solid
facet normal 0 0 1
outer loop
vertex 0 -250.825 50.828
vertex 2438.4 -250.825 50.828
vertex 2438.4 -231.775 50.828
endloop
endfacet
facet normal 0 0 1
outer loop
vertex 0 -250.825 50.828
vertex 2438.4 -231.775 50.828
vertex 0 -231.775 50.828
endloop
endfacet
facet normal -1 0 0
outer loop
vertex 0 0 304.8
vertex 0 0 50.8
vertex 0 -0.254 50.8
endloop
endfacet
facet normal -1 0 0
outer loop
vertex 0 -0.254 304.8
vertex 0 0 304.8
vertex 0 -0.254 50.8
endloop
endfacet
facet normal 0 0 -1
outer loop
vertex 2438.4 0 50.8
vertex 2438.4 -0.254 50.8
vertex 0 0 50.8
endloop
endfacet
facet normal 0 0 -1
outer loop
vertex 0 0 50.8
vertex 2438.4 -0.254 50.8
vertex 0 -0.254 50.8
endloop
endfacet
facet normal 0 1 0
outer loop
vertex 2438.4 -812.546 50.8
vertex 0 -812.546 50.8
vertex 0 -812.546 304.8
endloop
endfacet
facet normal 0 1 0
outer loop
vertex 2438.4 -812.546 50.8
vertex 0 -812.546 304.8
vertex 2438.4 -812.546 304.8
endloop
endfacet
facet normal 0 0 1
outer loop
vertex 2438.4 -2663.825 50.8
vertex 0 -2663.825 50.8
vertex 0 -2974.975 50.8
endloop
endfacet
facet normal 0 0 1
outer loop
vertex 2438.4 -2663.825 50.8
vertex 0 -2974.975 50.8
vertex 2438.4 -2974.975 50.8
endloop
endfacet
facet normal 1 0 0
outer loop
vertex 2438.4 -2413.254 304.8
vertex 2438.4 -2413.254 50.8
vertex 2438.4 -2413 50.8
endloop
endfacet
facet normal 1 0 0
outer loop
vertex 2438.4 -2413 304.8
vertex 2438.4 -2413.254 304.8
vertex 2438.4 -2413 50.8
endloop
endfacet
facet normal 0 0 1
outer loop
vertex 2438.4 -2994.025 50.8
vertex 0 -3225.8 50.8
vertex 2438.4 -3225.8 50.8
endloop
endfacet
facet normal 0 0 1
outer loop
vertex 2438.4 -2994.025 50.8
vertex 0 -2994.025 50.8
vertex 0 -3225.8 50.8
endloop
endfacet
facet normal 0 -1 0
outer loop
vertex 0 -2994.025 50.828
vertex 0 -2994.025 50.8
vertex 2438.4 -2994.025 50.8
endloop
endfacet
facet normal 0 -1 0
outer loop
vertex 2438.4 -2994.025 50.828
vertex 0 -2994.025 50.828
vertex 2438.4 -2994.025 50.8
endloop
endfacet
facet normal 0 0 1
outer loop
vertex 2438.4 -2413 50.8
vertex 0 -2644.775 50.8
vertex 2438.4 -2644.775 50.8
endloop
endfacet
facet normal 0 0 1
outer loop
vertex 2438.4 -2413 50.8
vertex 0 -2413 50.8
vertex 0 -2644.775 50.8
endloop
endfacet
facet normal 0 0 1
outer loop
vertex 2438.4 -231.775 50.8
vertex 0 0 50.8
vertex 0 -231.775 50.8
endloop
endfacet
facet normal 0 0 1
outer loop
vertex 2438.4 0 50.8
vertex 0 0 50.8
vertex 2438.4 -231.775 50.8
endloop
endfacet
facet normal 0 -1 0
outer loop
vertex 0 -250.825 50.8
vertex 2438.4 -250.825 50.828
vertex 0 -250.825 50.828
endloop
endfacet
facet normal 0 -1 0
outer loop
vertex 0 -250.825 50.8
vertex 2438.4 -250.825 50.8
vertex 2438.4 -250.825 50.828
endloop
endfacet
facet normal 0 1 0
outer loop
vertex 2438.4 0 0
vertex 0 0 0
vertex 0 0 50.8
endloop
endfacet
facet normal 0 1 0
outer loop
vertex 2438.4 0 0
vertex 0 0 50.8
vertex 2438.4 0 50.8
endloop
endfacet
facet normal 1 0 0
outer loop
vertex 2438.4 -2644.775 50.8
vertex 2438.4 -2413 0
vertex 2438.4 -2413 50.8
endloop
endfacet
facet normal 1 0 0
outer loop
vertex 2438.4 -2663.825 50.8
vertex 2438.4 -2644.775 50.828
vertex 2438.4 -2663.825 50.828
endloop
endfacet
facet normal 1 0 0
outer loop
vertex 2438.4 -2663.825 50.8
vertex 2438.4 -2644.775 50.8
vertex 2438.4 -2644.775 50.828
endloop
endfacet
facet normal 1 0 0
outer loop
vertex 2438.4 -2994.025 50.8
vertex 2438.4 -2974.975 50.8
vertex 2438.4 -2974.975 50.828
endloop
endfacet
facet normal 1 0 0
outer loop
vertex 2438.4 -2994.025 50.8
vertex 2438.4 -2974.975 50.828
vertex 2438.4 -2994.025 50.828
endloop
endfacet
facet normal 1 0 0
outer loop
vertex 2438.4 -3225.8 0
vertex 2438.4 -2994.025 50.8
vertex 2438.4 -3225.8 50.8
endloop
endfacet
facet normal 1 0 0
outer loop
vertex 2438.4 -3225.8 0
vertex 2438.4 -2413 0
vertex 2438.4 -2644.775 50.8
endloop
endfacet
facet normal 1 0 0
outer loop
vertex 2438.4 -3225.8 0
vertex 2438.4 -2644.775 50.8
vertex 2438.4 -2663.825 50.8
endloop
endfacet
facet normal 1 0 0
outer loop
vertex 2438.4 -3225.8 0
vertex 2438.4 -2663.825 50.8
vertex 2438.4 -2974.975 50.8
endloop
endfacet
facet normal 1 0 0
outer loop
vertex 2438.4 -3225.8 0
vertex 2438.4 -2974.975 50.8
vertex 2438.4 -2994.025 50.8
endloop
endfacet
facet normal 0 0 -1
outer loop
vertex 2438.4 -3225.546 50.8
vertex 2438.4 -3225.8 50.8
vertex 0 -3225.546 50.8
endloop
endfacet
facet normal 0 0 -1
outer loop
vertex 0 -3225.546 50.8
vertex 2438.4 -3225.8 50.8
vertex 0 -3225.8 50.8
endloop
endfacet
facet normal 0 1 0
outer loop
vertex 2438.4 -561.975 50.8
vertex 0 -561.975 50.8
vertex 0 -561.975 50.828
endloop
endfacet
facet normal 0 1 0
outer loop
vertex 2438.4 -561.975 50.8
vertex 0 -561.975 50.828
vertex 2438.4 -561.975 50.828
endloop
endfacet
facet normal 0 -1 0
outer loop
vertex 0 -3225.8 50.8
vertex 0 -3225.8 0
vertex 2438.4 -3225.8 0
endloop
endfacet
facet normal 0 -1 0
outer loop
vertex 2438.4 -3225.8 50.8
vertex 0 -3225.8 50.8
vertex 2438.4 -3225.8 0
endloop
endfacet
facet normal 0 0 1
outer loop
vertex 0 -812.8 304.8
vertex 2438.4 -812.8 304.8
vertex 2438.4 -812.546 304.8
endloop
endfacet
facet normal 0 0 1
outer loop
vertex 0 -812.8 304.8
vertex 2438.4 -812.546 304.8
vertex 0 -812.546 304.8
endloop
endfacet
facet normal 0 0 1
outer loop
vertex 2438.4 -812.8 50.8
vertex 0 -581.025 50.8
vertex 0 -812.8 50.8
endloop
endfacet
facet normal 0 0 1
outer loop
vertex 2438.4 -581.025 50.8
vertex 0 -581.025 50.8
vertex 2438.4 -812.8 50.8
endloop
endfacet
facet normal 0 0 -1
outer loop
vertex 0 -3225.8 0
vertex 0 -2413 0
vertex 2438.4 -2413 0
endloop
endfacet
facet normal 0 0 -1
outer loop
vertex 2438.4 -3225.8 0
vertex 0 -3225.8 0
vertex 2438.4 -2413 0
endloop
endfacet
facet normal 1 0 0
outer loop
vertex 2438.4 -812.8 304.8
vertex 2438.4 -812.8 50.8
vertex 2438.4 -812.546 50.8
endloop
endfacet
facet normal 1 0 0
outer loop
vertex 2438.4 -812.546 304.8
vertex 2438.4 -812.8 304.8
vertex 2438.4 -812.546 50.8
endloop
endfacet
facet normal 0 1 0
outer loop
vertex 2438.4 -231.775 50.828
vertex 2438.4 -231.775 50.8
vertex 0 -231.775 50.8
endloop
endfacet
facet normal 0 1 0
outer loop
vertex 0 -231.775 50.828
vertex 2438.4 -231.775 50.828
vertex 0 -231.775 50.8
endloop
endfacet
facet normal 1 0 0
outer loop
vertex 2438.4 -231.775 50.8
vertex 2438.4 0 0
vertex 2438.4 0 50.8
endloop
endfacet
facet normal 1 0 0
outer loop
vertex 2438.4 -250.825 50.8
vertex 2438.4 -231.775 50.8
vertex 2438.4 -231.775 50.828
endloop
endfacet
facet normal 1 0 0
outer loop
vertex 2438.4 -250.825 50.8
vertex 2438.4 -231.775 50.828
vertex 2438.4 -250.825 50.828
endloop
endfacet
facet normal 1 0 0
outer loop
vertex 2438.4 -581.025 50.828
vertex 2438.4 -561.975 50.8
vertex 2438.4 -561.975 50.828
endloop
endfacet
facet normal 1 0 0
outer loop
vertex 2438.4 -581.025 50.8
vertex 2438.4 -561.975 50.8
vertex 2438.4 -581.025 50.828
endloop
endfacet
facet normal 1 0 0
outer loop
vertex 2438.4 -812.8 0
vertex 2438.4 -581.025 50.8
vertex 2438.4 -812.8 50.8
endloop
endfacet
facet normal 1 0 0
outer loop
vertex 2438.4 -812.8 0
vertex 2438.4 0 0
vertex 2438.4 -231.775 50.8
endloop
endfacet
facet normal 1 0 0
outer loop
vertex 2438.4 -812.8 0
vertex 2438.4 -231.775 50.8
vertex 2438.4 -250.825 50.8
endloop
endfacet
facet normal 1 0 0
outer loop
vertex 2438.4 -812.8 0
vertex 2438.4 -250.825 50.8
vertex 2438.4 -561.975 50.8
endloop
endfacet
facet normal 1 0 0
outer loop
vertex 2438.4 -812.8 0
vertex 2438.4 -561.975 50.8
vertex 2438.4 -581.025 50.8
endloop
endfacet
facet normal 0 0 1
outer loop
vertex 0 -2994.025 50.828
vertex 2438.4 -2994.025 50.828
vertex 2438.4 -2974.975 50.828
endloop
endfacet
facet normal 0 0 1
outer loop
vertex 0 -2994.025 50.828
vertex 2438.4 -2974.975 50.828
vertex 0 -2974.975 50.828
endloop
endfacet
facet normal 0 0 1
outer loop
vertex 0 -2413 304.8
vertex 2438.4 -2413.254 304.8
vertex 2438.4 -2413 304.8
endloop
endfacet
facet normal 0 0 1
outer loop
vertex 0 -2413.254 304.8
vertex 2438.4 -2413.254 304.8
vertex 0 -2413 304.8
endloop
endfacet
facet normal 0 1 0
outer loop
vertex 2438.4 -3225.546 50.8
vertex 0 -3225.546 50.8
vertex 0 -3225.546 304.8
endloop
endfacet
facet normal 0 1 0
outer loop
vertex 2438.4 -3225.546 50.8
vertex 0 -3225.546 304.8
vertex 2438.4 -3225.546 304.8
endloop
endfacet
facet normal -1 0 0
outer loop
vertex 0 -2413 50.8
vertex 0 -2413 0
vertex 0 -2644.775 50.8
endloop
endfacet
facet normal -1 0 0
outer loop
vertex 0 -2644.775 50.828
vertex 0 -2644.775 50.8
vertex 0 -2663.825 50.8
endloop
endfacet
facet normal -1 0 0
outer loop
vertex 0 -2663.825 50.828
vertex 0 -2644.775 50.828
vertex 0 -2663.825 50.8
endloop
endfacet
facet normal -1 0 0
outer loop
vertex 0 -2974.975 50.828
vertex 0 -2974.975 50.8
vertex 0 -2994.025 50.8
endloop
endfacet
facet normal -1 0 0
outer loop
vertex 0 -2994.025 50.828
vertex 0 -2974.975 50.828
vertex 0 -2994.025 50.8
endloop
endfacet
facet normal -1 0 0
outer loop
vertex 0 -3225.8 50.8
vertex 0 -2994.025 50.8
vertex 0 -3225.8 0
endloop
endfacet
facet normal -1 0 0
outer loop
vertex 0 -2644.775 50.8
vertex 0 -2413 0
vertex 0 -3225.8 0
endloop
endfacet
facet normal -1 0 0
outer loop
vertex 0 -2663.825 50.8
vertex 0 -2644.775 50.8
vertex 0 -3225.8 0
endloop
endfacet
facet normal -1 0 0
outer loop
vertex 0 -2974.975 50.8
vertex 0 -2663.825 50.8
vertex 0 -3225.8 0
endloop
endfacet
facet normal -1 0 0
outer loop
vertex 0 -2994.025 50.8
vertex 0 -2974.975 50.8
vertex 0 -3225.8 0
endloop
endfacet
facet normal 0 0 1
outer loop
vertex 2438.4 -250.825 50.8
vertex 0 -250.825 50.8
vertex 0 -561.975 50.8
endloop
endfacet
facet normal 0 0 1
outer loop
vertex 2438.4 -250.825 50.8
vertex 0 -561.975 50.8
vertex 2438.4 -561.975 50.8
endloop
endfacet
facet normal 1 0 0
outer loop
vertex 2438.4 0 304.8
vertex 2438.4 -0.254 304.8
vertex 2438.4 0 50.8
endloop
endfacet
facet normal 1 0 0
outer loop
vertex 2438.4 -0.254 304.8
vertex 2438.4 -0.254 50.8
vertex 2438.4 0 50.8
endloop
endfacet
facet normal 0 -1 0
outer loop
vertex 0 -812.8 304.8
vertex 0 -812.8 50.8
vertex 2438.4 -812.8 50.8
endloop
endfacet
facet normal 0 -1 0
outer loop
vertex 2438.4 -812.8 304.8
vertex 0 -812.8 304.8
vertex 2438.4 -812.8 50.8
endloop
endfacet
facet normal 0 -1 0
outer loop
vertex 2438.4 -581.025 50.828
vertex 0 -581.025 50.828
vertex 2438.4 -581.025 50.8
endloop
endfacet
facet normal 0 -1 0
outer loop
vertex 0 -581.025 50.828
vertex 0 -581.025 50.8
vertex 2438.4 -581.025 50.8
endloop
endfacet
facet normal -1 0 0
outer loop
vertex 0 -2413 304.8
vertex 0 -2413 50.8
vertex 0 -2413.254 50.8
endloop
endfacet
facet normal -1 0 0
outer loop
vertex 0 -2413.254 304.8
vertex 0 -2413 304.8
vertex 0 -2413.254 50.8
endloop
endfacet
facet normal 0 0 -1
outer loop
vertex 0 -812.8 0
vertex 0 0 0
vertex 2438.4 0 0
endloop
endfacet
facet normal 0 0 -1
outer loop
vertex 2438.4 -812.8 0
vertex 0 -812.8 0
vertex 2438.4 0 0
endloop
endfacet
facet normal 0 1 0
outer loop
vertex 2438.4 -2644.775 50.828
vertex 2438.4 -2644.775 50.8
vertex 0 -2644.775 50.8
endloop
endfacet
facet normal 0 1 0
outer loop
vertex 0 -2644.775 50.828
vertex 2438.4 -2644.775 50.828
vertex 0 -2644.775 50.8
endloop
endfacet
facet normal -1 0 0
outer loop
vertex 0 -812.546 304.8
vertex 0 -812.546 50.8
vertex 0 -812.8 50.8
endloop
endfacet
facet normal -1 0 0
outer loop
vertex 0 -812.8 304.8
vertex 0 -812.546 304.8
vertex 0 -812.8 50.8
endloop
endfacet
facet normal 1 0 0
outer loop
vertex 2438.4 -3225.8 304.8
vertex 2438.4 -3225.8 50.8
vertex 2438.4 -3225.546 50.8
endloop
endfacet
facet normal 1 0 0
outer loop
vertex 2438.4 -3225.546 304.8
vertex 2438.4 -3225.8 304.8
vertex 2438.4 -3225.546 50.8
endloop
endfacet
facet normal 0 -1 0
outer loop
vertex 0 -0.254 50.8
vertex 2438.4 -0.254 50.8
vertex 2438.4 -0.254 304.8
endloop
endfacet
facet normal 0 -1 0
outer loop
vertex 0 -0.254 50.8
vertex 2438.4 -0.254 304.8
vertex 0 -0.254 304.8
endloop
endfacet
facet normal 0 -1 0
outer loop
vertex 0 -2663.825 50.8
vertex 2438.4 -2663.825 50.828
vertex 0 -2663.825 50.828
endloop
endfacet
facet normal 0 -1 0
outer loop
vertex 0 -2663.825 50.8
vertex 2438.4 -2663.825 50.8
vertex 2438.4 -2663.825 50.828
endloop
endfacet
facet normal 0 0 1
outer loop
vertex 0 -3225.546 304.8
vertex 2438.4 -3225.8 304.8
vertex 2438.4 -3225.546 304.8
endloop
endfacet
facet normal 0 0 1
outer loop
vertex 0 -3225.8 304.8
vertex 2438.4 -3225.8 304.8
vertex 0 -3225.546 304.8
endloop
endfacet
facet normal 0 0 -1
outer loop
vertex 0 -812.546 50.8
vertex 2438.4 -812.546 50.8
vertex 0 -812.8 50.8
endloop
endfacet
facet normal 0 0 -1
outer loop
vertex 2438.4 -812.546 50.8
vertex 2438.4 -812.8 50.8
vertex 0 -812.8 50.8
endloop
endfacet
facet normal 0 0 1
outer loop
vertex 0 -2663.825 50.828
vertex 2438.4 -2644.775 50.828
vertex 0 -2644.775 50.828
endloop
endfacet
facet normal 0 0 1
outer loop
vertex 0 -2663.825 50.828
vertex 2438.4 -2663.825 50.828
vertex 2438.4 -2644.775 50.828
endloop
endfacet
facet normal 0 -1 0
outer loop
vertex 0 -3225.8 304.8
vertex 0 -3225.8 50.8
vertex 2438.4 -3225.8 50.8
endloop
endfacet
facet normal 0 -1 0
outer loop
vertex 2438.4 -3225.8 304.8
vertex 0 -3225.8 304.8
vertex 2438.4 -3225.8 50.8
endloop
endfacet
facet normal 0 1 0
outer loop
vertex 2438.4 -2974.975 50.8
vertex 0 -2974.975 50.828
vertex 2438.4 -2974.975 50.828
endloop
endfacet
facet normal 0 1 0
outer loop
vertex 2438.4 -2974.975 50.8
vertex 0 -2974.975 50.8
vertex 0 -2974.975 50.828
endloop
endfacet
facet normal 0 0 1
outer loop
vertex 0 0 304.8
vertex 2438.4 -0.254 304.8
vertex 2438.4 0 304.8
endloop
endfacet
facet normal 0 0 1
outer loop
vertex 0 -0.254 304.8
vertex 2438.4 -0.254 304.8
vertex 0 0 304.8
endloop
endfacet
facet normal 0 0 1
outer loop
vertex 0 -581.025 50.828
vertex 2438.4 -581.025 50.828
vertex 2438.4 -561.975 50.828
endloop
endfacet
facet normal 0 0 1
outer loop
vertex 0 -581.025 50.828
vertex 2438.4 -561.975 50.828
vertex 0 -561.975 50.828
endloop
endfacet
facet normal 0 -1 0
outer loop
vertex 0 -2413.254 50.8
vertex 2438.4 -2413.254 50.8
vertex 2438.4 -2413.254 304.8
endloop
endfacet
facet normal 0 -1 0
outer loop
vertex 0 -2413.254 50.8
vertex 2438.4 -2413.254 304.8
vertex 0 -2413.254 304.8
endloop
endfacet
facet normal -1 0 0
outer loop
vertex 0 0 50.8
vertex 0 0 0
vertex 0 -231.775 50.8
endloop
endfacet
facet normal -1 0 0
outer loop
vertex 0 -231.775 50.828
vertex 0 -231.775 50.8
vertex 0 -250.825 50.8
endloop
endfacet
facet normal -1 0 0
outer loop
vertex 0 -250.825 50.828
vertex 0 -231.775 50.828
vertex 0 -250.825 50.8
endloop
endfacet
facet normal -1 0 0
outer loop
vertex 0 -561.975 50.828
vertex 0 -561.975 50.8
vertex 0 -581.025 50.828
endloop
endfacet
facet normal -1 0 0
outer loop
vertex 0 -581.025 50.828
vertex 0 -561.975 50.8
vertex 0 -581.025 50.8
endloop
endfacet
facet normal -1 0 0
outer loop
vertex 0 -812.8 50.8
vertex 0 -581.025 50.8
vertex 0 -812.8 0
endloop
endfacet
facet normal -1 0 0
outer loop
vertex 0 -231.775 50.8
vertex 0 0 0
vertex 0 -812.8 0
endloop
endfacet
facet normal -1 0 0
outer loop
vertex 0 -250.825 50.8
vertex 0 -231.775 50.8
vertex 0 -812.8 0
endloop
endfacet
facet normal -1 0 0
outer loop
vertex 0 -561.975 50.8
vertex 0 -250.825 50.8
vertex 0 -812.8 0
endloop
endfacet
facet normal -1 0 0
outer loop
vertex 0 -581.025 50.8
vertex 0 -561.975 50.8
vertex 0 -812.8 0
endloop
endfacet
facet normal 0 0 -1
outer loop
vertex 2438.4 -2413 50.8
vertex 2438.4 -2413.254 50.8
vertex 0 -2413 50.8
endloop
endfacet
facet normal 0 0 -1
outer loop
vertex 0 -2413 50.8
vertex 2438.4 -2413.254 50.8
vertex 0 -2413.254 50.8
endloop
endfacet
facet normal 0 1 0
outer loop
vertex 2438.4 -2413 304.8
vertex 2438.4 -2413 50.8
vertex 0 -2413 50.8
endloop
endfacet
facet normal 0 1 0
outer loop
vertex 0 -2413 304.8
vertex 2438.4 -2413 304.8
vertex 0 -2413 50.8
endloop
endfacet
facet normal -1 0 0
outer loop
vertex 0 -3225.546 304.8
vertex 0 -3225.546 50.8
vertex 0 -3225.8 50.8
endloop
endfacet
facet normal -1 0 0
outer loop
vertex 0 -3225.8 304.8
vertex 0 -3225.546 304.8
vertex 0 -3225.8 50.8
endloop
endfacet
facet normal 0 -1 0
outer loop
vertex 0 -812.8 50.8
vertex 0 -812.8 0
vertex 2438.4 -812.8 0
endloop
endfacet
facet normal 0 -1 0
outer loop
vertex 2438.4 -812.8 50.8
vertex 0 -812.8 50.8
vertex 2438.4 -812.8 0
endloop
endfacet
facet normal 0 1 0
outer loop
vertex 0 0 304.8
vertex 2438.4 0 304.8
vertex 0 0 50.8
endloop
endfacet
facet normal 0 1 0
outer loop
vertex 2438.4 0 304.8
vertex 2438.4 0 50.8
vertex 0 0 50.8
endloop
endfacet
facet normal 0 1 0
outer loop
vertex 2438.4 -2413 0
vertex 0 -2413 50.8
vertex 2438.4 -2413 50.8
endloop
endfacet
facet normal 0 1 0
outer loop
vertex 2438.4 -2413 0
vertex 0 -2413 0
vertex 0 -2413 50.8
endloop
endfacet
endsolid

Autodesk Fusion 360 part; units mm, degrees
sketch "Sketch1" plane through (0, 0, 0) normal (0, 0, 1) x (1, 0, 0)
  line L0 (0, 0) -> (0, -812.8)
  line L1 (0, -812.8) -> (0, -2413)
  line L2 (0, -2413) -> (0, -3225.8)
  line L3 (0, 0) -> (1219.2, 0)
  line L4 (1219.2, 0) -> (0, 0)
  line L5 (0, 0) -> (0, -812.8)
  line L6 (0, -812.8) -> (1219.2, -812.8)
  line L7 (1219.2, -812.8) -> (1219.2, 0)
  line L8 (0, -3225.8) -> (1219.2, -3225.8)
  line L9 (1219.2, -3225.8) -> (0, -3225.8)
  line L10 (0, -3225.8) -> (0, -2413)
  line L11 (0, -2413) -> (1219.2, -2413)
  line L12 (1219.2, -2413) -> (1219.2, -3225.8)
  line L13 (1219.2, -812.8) -> (1219.2, 0)
  line L14 (1219.2, 0) -> (2438.4, 0)
  line L15 (2438.4, 0) -> (2438.4, -812.8)
  line L16 (2438.4, -812.8) -> (1219.2, -812.8)
  line L17 (1219.2, -3225.8) -> (1219.2, -2413)
  line L18 (1219.2, -2413) -> (2438.4, -2413)
  line L19 (2438.4, -2413) -> (2438.4, -3225.8)
  line L20 (2438.4, -3225.8) -> (1219.2, -3225.8)
  dimension "d1" = 812.8
  dimension "d2" = 1600.2
  dimension "d3" = 812.8
  dimension "d4" = 1219.2
  dimension "d5" = 1219.2
  dimension "d8" = 1219.2
  dimension "d9" = 1219.2
extrude "Extrude2" add sketch "Sketch1" along normal blind 50.8 makes body 1 at (812.8, -270.9333, 0) makes body 2 at (812.8, -2954.8667, 0)
sketch "Sketch2" plane through (0, 0, 50.8) normal (0, 0, 1) x (-1, 0, 0)
  line L0 (-2438.4, 0) -> (0, 0)
  line L1 (0, 0) -> (0, 812.8)
  line L2 (0, 812.8) -> (-2438.4, 812.8)
  line L3 (-2438.4, 812.8) -> (-2438.4, 0)
  line L4 (-2438.4, 250.825) -> (0, 250.825)
  line L5 (-2438.4, 231.775) -> (0, 231.775)
  line L6 (0, 561.975) -> (-2438.4, 561.975)
  line L7 (0, 581.025) -> (-2438.4, 581.025)
  dimension "d12" = -250.825
  dimension "d13" = -231.775
  dimension "d14" = -250.825
  dimension "d15" = -231.775
extrude "Extrude3" add sketch "Sketch2" along normal blind 0.0279 contours L1 L3 L4 L5 | L1 L3 L6 L7 bodies 1
sketch "Sketch3" plane through (0, 0, 50.8) normal (0, 0, 1) x (-1, 0, 0)
  line L0 (-2438.4, 3225.8) -> (-2438.4, 2413)
  line L1 (-2438.4, 2413) -> (0, 2413)
  line L2 (0, 2413) -> (0, 3225.8)
  line L3 (0, 3225.8) -> (-2438.4, 3225.8)
  line L4 (-2438.4, 2663.825) -> (0, 2663.825)
  line L5 (-2438.4, 2644.775) -> (0, 2644.775)
  line L6 (0, 2974.975) -> (-2438.4, 2974.975)
  line L7 (0, 2994.025) -> (-2438.4, 2994.025)
  dimension "d18" = -250.825
  dimension "d19" = -231.775
  dimension "d20" = -250.825
  dimension "d21" = -231.775
extrude "Extrude4" add sketch "Sketch3" along normal blind 0.0279 contours L0 L2 L6 L7 | L0 L2 L4 L5 bodies 2
sketch "Sketch4" plane through (0, 0, 0) normal (0, 0, -1) x (1, 0, 0)
  line L0 (2438.4, 2413) -> (2438.4, 3225.8)
  line L1 (2438.4, 3225.8) -> (0, 3225.8)
  line L2 (0, 3225.8) -> (0, 2413)
  line L3 (0, 2413) -> (2438.4, 2413)
sketch "Sketch5" plane through (0, 0, 50.8) normal (0, 0, 1) x (-1, 0, 0)
  line L0 (-2438.4, 2994.025) -> (0, 2994.025)
  line L1 (0, 2994.025) -> (0, 3225.8)
  line L2 (0, 3225.8) -> (-2438.4, 3225.8)
  line L3 (-2438.4, 3225.8) -> (-2438.4, 2994.025)
  line L4 (0, 3225.546) -> (-2438.4, 3225.546)
  dimension "d24" = -0.254
extrude "Extrude5" add sketch "Sketch5" along normal blind 254 separate body contours L1 L2 L3 L4 makes body 3
sketch "Sketch6" plane through (0, 0, 50.8) normal (0, 0, 1) x (-1, 0, 0)
  line L0 (0, 2644.775) -> (-2438.4, 2644.775)
  line L1 (-2438.4, 2644.775) -> (-2438.4, 2413)
  line L2 (-2438.4, 2413) -> (0, 2413)
  line L3 (0, 2413) -> (0, 2644.775)
  line L4 (-2438.4, 2413.254) -> (0, 2413.254)
  dimension "d27" = -0.254
extrude "Extrude6" add sketch "Sketch6" along normal blind 254 separate body contours L1 L2 L3 L4 makes body 4
sketch "Sketch7" plane through (0, 0, 50.8) normal (0, 0, 1) x (-1, 0, 0)
  line L0 (0, 231.775) -> (-2438.4, 231.775)
  line L1 (-2438.4, 231.775) -> (-2438.4, 0)
  line L2 (-2438.4, 0) -> (0, 0)
  line L3 (0, 0) -> (0, 231.775)
  line L4 (-2438.4, 0.254) -> (0, 0.254)
  dimension "d30" = -0.254
extrude "Extrude7" add sketch "Sketch7" along normal blind 254 separate body contours L1 L2 L3 L4 makes body 5
sketch "Sketch8" plane through (0, 0, 50.8) normal (0, 0, 1) x (-1, 0, 0)
  line L0 (-2438.4, 581.025) -> (0, 581.025)
  line L1 (0, 581.025) -> (0, 812.8)
  line L2 (0, 812.8) -> (-2438.4, 812.8)
  line L3 (-2438.4, 812.8) -> (-2438.4, 581.025)
  line L4 (0, 812.546) -> (-2438.4, 812.546)
  dimension "d33" = -0.254
extrude "Extrude8" add sketch "Sketch8" along normal blind 254 separate body contours L1 L2 L3 L4 makes body 6
equation "d4 = ( 24 * 2 ) * 1 in"
equation "d5 = ( 24 * 2 ) * 1 in"
equation "d8 = ( 24 * 2 ) * 1 in"
equation "d9 = ( 24 * 2 ) * 1 in"
